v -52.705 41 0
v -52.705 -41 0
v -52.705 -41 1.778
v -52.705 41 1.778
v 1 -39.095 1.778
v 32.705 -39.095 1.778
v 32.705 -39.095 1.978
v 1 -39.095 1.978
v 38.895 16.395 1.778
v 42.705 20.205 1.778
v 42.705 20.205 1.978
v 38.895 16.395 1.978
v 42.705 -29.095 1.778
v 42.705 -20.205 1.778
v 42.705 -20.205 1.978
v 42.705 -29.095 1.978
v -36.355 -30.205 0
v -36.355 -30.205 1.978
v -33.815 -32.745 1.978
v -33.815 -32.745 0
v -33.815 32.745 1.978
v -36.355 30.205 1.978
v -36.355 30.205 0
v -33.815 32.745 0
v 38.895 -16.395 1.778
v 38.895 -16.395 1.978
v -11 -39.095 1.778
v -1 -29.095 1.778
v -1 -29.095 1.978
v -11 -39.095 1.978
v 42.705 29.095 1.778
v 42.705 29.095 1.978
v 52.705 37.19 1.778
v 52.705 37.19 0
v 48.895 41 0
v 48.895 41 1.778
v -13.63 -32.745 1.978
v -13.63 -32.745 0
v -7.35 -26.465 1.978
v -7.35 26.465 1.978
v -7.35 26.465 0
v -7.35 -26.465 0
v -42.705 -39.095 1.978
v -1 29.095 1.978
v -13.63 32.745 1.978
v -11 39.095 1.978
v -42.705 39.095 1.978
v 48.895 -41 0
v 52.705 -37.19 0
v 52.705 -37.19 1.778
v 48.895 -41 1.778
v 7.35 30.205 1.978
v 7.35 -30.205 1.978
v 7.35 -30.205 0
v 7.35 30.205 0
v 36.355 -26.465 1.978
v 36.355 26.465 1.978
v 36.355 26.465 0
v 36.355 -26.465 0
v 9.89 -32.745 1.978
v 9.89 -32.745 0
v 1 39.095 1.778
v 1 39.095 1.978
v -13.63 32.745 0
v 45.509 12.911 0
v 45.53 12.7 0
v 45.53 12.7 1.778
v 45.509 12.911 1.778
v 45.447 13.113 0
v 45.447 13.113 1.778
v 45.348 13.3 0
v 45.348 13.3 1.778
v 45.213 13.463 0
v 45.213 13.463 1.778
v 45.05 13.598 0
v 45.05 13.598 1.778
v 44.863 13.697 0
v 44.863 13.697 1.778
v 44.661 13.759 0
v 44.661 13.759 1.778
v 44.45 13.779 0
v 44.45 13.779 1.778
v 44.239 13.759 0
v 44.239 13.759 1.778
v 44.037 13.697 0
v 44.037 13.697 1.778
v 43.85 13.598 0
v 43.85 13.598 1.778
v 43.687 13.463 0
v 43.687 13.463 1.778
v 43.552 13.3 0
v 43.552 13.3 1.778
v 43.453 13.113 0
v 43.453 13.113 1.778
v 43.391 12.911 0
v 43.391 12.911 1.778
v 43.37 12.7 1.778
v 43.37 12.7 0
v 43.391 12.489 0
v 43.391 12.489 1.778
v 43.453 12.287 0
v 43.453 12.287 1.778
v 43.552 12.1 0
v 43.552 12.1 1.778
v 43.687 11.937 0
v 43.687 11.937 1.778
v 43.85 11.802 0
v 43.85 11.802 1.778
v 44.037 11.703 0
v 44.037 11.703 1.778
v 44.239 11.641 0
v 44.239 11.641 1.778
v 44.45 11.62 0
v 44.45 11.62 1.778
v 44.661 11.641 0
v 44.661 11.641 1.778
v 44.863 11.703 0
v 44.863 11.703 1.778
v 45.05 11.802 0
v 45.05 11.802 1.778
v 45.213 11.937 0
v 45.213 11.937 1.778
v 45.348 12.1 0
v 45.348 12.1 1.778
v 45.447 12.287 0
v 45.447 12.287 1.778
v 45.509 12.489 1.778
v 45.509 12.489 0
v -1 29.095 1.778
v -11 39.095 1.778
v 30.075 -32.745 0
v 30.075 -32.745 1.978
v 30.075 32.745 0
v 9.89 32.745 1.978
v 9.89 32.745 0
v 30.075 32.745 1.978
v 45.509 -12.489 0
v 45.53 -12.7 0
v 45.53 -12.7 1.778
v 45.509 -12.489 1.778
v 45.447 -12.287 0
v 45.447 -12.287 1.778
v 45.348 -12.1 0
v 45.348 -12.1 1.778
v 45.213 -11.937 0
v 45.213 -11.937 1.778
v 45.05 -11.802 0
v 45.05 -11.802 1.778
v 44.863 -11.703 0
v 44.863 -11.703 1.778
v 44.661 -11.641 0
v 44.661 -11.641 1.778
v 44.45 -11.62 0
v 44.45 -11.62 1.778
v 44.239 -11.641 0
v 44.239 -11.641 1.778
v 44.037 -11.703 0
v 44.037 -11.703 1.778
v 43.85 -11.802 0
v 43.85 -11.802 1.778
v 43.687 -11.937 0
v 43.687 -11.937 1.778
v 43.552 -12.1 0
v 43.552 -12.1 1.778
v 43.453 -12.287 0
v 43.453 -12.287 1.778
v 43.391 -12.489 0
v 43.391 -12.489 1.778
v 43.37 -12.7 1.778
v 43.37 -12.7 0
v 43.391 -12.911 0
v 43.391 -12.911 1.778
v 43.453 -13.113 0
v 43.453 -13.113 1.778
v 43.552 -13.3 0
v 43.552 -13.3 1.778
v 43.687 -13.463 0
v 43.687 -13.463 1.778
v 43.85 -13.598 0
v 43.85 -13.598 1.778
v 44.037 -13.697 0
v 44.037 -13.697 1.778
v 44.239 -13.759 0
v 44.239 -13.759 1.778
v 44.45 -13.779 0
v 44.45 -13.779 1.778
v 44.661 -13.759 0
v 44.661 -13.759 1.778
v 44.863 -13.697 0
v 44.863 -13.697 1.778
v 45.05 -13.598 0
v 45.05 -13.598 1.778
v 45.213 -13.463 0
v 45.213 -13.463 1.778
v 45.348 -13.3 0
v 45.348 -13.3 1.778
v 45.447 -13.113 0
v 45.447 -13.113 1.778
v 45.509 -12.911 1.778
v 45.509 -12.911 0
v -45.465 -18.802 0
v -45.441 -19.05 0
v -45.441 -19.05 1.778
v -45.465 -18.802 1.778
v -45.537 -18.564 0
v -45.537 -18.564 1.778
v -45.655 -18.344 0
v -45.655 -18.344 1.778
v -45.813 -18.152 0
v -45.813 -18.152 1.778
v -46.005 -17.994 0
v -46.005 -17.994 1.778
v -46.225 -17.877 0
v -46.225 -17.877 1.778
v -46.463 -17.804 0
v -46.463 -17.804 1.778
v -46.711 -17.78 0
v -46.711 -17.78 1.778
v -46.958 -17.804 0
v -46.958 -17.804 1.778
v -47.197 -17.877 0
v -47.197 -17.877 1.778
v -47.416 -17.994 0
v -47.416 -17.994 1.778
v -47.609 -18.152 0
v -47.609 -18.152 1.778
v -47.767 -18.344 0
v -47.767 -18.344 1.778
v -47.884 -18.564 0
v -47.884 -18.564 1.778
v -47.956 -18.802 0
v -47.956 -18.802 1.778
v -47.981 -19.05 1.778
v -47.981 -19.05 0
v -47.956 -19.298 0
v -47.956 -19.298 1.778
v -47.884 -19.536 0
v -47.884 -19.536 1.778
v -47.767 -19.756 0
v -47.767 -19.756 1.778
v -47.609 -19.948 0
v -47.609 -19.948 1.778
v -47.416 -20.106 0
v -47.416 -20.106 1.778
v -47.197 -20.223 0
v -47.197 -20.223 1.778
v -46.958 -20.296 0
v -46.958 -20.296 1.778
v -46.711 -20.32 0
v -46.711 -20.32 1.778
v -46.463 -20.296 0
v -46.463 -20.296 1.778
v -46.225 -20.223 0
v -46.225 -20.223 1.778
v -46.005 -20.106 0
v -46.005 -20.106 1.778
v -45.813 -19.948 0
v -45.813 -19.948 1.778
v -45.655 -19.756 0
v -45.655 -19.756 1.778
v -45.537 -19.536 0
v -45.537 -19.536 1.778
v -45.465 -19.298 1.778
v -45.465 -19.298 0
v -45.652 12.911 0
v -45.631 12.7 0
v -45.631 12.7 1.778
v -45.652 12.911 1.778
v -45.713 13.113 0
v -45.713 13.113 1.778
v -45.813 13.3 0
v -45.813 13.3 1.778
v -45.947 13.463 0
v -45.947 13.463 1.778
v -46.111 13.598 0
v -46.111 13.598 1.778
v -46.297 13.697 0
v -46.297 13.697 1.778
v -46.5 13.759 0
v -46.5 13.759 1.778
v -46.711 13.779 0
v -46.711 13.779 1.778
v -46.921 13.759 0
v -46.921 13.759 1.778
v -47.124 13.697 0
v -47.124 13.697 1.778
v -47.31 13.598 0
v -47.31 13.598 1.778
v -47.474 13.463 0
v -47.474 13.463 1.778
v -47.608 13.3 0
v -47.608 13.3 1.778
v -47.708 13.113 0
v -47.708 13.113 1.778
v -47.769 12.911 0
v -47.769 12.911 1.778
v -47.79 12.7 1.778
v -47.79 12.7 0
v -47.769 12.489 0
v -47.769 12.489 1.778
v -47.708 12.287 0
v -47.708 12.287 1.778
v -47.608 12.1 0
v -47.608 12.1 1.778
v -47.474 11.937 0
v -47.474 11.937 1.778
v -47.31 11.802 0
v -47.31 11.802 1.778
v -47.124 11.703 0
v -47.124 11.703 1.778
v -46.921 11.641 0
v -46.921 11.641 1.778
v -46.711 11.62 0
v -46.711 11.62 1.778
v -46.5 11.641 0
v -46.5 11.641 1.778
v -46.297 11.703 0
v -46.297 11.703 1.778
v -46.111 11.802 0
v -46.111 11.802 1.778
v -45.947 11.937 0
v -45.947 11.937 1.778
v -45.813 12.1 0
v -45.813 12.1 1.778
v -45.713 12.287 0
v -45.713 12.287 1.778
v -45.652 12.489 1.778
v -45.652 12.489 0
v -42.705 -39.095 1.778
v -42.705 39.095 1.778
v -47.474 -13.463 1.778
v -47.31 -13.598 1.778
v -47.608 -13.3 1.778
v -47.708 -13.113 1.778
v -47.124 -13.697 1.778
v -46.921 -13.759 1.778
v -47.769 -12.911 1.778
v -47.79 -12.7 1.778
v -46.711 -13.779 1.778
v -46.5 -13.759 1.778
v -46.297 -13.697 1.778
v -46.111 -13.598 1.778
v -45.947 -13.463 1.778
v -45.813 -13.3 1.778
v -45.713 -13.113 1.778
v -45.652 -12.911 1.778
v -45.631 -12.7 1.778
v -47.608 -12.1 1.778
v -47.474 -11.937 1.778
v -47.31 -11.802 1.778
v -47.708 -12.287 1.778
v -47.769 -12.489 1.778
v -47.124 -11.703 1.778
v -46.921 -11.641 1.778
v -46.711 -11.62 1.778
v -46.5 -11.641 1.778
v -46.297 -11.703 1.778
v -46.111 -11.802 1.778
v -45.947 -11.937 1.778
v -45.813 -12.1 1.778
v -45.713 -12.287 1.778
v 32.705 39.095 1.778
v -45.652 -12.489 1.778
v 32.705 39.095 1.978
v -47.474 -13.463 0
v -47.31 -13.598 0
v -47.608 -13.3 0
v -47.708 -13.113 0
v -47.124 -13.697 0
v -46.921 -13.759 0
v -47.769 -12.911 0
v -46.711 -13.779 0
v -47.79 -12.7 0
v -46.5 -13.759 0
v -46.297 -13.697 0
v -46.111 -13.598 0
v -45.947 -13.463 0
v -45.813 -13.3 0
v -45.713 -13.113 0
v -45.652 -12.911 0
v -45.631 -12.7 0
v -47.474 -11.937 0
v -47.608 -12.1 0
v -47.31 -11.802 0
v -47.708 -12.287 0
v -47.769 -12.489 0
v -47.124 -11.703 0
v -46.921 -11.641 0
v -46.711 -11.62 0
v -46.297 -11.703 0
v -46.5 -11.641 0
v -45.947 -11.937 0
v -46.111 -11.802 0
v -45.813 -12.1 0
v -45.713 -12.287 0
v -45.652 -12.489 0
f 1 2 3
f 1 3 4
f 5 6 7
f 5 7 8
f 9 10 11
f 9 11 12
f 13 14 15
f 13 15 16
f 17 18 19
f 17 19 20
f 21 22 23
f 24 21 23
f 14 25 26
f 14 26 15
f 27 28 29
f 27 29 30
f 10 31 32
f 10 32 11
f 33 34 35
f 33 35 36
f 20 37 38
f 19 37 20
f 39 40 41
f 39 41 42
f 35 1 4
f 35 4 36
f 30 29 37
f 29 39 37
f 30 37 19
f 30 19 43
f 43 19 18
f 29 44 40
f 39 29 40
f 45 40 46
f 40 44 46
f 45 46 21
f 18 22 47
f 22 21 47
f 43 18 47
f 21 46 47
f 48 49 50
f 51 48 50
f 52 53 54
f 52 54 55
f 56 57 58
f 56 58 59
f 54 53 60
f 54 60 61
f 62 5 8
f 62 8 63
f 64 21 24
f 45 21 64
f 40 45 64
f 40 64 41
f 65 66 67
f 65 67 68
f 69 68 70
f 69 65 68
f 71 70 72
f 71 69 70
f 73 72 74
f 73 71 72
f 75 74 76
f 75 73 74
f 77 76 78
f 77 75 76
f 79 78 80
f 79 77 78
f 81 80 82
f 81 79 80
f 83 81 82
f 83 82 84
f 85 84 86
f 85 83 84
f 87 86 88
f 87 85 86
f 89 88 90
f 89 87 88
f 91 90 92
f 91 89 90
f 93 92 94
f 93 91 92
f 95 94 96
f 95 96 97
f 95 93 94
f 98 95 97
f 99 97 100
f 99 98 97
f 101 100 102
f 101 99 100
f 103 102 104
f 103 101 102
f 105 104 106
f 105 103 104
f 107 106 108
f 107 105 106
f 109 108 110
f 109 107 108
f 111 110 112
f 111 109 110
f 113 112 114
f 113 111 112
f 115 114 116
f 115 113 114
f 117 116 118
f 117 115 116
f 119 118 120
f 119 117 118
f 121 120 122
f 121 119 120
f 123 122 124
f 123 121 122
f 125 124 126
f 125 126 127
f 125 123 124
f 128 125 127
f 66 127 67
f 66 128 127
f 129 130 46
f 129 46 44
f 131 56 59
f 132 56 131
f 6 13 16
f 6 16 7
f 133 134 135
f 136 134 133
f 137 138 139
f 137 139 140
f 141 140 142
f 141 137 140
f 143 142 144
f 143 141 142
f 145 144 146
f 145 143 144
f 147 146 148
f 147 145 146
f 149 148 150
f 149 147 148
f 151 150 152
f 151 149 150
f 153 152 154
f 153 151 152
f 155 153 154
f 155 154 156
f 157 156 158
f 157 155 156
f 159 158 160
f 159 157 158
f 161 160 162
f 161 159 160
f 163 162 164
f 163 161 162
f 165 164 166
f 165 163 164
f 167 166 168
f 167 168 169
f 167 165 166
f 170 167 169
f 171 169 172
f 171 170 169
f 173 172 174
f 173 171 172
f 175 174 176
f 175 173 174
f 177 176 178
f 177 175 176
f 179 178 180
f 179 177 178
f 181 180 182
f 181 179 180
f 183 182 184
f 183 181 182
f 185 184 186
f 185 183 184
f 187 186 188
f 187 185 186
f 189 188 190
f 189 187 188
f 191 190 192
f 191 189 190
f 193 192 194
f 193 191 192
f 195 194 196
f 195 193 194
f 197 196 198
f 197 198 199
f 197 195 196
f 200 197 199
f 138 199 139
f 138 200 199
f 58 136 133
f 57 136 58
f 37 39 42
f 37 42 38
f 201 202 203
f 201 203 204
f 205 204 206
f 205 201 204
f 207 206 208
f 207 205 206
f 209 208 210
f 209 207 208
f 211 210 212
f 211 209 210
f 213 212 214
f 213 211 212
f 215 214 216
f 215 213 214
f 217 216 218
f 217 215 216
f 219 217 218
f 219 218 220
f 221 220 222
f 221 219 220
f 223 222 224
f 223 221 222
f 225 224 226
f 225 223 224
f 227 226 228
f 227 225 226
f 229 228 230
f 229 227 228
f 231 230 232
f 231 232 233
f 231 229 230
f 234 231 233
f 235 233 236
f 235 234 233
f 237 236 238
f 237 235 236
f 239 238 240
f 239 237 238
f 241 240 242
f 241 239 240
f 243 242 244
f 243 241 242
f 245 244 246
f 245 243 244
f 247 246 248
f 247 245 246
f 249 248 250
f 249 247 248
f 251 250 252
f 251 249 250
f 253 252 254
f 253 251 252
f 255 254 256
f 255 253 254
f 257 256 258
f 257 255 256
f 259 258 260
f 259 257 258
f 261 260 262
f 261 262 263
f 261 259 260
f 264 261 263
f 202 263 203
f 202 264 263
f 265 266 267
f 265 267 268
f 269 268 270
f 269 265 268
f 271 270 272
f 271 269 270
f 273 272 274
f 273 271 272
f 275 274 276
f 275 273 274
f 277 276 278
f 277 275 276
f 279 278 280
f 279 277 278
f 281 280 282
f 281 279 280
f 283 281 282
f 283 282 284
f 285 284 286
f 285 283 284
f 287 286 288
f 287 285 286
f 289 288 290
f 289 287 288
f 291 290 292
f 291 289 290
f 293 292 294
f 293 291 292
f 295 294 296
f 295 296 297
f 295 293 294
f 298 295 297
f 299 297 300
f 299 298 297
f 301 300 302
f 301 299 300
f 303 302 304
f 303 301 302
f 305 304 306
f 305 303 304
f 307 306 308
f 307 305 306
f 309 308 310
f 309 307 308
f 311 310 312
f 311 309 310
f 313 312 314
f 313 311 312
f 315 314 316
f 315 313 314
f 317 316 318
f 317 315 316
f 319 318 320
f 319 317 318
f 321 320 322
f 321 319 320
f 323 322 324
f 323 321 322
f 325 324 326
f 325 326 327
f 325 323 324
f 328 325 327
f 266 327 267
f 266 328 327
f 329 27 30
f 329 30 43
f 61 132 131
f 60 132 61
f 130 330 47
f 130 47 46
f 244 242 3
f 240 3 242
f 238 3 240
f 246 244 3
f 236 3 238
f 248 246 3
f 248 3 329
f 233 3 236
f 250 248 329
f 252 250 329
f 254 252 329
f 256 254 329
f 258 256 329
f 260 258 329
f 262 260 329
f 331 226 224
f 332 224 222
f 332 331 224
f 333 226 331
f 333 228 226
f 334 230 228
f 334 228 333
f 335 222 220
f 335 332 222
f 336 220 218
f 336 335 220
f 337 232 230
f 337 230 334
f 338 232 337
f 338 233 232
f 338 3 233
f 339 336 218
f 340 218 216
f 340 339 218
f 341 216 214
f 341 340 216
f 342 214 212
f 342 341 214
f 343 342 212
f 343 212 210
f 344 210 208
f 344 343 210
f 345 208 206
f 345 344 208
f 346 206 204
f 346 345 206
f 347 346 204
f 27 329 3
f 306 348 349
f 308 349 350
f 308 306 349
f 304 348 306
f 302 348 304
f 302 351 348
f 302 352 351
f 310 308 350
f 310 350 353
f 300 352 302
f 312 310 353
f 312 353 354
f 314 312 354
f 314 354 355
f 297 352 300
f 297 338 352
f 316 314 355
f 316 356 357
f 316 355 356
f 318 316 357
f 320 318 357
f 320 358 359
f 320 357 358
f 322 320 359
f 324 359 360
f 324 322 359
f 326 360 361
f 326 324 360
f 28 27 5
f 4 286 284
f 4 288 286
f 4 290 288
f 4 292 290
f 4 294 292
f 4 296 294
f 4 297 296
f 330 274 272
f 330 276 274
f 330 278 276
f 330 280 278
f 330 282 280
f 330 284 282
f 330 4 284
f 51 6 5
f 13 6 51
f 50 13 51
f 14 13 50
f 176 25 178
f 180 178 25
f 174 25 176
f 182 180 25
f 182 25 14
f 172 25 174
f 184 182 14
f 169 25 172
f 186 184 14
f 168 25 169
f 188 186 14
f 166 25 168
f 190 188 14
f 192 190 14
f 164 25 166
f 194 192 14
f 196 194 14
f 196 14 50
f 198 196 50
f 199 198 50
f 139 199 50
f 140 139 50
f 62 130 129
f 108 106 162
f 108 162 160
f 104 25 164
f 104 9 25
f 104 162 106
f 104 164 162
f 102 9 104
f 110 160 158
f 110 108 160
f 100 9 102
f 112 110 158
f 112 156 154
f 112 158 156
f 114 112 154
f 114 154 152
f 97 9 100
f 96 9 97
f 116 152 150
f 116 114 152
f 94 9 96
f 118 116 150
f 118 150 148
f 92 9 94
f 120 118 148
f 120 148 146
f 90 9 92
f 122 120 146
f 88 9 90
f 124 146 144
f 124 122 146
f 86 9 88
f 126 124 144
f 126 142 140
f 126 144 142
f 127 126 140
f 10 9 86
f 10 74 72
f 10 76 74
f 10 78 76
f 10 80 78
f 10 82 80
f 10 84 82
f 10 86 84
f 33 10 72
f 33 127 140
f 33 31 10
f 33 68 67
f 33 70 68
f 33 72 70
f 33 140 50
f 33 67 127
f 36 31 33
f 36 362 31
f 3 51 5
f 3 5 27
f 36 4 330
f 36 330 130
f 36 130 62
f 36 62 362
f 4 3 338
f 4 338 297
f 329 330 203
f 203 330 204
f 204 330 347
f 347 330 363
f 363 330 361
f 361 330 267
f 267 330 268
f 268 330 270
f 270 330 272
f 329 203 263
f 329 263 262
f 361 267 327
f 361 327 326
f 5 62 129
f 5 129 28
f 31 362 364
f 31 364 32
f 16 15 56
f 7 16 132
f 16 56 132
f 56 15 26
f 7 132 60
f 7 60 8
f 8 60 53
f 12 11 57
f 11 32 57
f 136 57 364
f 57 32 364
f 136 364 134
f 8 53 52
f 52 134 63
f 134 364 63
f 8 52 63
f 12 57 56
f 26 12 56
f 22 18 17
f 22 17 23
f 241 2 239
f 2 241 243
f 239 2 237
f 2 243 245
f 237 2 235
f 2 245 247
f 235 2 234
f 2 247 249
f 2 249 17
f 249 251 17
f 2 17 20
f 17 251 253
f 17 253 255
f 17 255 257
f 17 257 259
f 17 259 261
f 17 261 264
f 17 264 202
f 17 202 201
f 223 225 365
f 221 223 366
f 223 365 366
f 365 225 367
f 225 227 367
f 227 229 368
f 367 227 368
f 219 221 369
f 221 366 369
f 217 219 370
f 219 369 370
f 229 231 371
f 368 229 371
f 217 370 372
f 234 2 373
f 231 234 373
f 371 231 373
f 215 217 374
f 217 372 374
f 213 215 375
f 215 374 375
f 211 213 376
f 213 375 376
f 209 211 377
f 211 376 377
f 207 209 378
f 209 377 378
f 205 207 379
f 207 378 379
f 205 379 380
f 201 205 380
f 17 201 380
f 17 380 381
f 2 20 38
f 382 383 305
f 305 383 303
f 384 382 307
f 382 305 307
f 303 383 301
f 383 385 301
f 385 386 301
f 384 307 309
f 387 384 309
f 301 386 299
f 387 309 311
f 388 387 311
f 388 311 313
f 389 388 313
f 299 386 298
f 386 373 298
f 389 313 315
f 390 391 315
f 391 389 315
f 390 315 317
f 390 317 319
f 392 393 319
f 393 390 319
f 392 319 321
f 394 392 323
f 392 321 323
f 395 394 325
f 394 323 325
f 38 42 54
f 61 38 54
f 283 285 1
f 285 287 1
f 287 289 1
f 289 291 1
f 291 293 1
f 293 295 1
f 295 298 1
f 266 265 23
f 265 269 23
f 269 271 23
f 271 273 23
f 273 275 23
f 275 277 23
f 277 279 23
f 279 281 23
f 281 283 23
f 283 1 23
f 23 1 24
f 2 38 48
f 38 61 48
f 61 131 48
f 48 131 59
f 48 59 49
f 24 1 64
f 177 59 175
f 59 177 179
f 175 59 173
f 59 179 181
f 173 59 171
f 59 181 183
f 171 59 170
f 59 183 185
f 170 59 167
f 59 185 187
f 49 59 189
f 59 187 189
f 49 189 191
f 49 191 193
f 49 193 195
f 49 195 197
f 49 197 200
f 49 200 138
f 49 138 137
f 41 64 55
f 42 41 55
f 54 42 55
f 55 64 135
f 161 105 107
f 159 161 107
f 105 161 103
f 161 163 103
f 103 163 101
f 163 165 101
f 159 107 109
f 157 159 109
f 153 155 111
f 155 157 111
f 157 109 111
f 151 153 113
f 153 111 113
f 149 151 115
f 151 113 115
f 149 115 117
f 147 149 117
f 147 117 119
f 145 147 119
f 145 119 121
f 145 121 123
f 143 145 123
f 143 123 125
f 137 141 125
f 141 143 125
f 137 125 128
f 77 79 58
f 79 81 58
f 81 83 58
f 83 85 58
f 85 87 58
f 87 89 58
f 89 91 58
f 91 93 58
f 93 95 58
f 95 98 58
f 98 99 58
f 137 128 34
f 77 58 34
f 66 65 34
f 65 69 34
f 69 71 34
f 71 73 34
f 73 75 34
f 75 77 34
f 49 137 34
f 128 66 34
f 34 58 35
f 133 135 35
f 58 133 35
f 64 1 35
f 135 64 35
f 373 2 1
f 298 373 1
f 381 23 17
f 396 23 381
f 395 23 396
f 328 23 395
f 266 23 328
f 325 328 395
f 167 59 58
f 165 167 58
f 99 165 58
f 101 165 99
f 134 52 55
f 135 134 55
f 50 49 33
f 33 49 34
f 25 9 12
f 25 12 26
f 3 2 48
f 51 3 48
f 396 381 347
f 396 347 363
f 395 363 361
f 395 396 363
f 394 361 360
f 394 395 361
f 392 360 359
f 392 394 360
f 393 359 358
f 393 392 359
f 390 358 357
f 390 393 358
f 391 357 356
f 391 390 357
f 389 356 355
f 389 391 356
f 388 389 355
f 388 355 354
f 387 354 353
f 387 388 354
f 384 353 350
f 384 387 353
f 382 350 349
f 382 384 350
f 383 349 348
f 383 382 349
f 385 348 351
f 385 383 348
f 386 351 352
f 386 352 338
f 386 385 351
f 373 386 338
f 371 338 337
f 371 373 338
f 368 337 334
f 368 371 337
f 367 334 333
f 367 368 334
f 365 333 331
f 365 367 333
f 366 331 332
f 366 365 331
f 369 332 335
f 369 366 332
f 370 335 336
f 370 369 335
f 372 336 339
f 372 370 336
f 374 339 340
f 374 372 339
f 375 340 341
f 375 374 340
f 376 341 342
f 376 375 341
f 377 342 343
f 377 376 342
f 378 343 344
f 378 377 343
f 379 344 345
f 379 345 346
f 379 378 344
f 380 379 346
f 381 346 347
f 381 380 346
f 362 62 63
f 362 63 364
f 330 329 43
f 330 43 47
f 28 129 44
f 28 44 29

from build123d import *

# Parameters (mm, degrees)
SKETCH1_W           = 105.41
SKETCH1_H           = 82
SKETCH1_R           = 1.0795
SKETCH1_R_2         = 1.27
BOSS_EXTRUDE1_DEPTH = 1.778
BOSS_EXTRUDE2_DEPTH = 0.2
CUT_EXTRUDE1_DEPTH  = 2.978
CHAMFER1_SIZE       = 2.54
CHAMFER2_SIZE       = 3.81


with BuildPart() as part:
    # Sketch1 → Boss-Extrude1 (new body)
    with BuildSketch(Plane.XY):
        Rectangle(SKETCH1_W, SKETCH1_H)
        with Locations((44.45, 12.7)):
            Circle(SKETCH1_R, mode=Mode.SUBTRACT)
        with Locations((44.45, -12.7)):
            Circle(SKETCH1_R, mode=Mode.SUBTRACT)
        with Locations((-46.7106, 12.7)):
            Circle(SKETCH1_R, mode=Mode.SUBTRACT)
        with Locations((-46.7106, -12.7)):
            Circle(SKETCH1_R, mode=Mode.SUBTRACT)
        with Locations((-46.7106, -19.05)):
            Circle(SKETCH1_R_2, mode=Mode.SUBTRACT)
    extrude(amount=BOSS_EXTRUDE1_DEPTH)

    # Sketch2 → Boss-Extrude2 (add)
    with BuildSketch(Plane.XY.offset(1.778)):
        Polygon((-11, 39.095), (-1, 29.095), (-1, -29.095), (-11, -39.095), (-42.705, -39.095), (-42.705, 39.095), align=None)
        Polygon((42.705, 20.205), (38.895, 16.395), (38.895, -16.395), (42.705, -20.205), (42.705, -29.095), (32.705, -39.095), (1, -39.095), (1, 39.095), (32.705, 39.095), (42.705, 29.095), align=None)
    extrude(amount=BOSS_EXTRUDE2_DEPTH)

    # Sketch3 → Cut-Extrude1 (cut, through all)
    with BuildSketch(Plane.XY.offset(1.978)):
        Polygon((-36.355, -32.745), (-36.355, 32.745), (-13.630256121, 32.745), (-7.35, 26.464743879), (-7.35, -26.464743879), (-13.630256121, -32.745), align=None)
        Polygon((7.35, -32.745), (7.35, 32.745), (30.074743879, 32.745), (36.355, 26.464743879), (36.355, -26.464743879), (30.074743879, -32.745), align=None)
    extrude(amount=-CUT_EXTRUDE1_DEPTH, mode=Mode.SUBTRACT)

    # Chamfer1
    chamfer1_edges = [part.edges().sort_by_distance(p)[0] for p in [
        (-36.355, -32.745, 0.989),
        (-36.355, 32.745, 0.989),
        (7.35, -32.745, 0.989),
        (7.35, 32.745, 0.989),
    ]]
    chamfer(chamfer1_edges, length=CHAMFER1_SIZE)

    # Chamfer2
    chamfer2_edges = [part.edges().sort_by_distance(p)[0] for p in [
        (52.705, 41, 0.889),
        (52.705, -41, 0.889),
    ]]
    chamfer(chamfer2_edges, length=CHAMFER2_SIZE)


solid = part.part
